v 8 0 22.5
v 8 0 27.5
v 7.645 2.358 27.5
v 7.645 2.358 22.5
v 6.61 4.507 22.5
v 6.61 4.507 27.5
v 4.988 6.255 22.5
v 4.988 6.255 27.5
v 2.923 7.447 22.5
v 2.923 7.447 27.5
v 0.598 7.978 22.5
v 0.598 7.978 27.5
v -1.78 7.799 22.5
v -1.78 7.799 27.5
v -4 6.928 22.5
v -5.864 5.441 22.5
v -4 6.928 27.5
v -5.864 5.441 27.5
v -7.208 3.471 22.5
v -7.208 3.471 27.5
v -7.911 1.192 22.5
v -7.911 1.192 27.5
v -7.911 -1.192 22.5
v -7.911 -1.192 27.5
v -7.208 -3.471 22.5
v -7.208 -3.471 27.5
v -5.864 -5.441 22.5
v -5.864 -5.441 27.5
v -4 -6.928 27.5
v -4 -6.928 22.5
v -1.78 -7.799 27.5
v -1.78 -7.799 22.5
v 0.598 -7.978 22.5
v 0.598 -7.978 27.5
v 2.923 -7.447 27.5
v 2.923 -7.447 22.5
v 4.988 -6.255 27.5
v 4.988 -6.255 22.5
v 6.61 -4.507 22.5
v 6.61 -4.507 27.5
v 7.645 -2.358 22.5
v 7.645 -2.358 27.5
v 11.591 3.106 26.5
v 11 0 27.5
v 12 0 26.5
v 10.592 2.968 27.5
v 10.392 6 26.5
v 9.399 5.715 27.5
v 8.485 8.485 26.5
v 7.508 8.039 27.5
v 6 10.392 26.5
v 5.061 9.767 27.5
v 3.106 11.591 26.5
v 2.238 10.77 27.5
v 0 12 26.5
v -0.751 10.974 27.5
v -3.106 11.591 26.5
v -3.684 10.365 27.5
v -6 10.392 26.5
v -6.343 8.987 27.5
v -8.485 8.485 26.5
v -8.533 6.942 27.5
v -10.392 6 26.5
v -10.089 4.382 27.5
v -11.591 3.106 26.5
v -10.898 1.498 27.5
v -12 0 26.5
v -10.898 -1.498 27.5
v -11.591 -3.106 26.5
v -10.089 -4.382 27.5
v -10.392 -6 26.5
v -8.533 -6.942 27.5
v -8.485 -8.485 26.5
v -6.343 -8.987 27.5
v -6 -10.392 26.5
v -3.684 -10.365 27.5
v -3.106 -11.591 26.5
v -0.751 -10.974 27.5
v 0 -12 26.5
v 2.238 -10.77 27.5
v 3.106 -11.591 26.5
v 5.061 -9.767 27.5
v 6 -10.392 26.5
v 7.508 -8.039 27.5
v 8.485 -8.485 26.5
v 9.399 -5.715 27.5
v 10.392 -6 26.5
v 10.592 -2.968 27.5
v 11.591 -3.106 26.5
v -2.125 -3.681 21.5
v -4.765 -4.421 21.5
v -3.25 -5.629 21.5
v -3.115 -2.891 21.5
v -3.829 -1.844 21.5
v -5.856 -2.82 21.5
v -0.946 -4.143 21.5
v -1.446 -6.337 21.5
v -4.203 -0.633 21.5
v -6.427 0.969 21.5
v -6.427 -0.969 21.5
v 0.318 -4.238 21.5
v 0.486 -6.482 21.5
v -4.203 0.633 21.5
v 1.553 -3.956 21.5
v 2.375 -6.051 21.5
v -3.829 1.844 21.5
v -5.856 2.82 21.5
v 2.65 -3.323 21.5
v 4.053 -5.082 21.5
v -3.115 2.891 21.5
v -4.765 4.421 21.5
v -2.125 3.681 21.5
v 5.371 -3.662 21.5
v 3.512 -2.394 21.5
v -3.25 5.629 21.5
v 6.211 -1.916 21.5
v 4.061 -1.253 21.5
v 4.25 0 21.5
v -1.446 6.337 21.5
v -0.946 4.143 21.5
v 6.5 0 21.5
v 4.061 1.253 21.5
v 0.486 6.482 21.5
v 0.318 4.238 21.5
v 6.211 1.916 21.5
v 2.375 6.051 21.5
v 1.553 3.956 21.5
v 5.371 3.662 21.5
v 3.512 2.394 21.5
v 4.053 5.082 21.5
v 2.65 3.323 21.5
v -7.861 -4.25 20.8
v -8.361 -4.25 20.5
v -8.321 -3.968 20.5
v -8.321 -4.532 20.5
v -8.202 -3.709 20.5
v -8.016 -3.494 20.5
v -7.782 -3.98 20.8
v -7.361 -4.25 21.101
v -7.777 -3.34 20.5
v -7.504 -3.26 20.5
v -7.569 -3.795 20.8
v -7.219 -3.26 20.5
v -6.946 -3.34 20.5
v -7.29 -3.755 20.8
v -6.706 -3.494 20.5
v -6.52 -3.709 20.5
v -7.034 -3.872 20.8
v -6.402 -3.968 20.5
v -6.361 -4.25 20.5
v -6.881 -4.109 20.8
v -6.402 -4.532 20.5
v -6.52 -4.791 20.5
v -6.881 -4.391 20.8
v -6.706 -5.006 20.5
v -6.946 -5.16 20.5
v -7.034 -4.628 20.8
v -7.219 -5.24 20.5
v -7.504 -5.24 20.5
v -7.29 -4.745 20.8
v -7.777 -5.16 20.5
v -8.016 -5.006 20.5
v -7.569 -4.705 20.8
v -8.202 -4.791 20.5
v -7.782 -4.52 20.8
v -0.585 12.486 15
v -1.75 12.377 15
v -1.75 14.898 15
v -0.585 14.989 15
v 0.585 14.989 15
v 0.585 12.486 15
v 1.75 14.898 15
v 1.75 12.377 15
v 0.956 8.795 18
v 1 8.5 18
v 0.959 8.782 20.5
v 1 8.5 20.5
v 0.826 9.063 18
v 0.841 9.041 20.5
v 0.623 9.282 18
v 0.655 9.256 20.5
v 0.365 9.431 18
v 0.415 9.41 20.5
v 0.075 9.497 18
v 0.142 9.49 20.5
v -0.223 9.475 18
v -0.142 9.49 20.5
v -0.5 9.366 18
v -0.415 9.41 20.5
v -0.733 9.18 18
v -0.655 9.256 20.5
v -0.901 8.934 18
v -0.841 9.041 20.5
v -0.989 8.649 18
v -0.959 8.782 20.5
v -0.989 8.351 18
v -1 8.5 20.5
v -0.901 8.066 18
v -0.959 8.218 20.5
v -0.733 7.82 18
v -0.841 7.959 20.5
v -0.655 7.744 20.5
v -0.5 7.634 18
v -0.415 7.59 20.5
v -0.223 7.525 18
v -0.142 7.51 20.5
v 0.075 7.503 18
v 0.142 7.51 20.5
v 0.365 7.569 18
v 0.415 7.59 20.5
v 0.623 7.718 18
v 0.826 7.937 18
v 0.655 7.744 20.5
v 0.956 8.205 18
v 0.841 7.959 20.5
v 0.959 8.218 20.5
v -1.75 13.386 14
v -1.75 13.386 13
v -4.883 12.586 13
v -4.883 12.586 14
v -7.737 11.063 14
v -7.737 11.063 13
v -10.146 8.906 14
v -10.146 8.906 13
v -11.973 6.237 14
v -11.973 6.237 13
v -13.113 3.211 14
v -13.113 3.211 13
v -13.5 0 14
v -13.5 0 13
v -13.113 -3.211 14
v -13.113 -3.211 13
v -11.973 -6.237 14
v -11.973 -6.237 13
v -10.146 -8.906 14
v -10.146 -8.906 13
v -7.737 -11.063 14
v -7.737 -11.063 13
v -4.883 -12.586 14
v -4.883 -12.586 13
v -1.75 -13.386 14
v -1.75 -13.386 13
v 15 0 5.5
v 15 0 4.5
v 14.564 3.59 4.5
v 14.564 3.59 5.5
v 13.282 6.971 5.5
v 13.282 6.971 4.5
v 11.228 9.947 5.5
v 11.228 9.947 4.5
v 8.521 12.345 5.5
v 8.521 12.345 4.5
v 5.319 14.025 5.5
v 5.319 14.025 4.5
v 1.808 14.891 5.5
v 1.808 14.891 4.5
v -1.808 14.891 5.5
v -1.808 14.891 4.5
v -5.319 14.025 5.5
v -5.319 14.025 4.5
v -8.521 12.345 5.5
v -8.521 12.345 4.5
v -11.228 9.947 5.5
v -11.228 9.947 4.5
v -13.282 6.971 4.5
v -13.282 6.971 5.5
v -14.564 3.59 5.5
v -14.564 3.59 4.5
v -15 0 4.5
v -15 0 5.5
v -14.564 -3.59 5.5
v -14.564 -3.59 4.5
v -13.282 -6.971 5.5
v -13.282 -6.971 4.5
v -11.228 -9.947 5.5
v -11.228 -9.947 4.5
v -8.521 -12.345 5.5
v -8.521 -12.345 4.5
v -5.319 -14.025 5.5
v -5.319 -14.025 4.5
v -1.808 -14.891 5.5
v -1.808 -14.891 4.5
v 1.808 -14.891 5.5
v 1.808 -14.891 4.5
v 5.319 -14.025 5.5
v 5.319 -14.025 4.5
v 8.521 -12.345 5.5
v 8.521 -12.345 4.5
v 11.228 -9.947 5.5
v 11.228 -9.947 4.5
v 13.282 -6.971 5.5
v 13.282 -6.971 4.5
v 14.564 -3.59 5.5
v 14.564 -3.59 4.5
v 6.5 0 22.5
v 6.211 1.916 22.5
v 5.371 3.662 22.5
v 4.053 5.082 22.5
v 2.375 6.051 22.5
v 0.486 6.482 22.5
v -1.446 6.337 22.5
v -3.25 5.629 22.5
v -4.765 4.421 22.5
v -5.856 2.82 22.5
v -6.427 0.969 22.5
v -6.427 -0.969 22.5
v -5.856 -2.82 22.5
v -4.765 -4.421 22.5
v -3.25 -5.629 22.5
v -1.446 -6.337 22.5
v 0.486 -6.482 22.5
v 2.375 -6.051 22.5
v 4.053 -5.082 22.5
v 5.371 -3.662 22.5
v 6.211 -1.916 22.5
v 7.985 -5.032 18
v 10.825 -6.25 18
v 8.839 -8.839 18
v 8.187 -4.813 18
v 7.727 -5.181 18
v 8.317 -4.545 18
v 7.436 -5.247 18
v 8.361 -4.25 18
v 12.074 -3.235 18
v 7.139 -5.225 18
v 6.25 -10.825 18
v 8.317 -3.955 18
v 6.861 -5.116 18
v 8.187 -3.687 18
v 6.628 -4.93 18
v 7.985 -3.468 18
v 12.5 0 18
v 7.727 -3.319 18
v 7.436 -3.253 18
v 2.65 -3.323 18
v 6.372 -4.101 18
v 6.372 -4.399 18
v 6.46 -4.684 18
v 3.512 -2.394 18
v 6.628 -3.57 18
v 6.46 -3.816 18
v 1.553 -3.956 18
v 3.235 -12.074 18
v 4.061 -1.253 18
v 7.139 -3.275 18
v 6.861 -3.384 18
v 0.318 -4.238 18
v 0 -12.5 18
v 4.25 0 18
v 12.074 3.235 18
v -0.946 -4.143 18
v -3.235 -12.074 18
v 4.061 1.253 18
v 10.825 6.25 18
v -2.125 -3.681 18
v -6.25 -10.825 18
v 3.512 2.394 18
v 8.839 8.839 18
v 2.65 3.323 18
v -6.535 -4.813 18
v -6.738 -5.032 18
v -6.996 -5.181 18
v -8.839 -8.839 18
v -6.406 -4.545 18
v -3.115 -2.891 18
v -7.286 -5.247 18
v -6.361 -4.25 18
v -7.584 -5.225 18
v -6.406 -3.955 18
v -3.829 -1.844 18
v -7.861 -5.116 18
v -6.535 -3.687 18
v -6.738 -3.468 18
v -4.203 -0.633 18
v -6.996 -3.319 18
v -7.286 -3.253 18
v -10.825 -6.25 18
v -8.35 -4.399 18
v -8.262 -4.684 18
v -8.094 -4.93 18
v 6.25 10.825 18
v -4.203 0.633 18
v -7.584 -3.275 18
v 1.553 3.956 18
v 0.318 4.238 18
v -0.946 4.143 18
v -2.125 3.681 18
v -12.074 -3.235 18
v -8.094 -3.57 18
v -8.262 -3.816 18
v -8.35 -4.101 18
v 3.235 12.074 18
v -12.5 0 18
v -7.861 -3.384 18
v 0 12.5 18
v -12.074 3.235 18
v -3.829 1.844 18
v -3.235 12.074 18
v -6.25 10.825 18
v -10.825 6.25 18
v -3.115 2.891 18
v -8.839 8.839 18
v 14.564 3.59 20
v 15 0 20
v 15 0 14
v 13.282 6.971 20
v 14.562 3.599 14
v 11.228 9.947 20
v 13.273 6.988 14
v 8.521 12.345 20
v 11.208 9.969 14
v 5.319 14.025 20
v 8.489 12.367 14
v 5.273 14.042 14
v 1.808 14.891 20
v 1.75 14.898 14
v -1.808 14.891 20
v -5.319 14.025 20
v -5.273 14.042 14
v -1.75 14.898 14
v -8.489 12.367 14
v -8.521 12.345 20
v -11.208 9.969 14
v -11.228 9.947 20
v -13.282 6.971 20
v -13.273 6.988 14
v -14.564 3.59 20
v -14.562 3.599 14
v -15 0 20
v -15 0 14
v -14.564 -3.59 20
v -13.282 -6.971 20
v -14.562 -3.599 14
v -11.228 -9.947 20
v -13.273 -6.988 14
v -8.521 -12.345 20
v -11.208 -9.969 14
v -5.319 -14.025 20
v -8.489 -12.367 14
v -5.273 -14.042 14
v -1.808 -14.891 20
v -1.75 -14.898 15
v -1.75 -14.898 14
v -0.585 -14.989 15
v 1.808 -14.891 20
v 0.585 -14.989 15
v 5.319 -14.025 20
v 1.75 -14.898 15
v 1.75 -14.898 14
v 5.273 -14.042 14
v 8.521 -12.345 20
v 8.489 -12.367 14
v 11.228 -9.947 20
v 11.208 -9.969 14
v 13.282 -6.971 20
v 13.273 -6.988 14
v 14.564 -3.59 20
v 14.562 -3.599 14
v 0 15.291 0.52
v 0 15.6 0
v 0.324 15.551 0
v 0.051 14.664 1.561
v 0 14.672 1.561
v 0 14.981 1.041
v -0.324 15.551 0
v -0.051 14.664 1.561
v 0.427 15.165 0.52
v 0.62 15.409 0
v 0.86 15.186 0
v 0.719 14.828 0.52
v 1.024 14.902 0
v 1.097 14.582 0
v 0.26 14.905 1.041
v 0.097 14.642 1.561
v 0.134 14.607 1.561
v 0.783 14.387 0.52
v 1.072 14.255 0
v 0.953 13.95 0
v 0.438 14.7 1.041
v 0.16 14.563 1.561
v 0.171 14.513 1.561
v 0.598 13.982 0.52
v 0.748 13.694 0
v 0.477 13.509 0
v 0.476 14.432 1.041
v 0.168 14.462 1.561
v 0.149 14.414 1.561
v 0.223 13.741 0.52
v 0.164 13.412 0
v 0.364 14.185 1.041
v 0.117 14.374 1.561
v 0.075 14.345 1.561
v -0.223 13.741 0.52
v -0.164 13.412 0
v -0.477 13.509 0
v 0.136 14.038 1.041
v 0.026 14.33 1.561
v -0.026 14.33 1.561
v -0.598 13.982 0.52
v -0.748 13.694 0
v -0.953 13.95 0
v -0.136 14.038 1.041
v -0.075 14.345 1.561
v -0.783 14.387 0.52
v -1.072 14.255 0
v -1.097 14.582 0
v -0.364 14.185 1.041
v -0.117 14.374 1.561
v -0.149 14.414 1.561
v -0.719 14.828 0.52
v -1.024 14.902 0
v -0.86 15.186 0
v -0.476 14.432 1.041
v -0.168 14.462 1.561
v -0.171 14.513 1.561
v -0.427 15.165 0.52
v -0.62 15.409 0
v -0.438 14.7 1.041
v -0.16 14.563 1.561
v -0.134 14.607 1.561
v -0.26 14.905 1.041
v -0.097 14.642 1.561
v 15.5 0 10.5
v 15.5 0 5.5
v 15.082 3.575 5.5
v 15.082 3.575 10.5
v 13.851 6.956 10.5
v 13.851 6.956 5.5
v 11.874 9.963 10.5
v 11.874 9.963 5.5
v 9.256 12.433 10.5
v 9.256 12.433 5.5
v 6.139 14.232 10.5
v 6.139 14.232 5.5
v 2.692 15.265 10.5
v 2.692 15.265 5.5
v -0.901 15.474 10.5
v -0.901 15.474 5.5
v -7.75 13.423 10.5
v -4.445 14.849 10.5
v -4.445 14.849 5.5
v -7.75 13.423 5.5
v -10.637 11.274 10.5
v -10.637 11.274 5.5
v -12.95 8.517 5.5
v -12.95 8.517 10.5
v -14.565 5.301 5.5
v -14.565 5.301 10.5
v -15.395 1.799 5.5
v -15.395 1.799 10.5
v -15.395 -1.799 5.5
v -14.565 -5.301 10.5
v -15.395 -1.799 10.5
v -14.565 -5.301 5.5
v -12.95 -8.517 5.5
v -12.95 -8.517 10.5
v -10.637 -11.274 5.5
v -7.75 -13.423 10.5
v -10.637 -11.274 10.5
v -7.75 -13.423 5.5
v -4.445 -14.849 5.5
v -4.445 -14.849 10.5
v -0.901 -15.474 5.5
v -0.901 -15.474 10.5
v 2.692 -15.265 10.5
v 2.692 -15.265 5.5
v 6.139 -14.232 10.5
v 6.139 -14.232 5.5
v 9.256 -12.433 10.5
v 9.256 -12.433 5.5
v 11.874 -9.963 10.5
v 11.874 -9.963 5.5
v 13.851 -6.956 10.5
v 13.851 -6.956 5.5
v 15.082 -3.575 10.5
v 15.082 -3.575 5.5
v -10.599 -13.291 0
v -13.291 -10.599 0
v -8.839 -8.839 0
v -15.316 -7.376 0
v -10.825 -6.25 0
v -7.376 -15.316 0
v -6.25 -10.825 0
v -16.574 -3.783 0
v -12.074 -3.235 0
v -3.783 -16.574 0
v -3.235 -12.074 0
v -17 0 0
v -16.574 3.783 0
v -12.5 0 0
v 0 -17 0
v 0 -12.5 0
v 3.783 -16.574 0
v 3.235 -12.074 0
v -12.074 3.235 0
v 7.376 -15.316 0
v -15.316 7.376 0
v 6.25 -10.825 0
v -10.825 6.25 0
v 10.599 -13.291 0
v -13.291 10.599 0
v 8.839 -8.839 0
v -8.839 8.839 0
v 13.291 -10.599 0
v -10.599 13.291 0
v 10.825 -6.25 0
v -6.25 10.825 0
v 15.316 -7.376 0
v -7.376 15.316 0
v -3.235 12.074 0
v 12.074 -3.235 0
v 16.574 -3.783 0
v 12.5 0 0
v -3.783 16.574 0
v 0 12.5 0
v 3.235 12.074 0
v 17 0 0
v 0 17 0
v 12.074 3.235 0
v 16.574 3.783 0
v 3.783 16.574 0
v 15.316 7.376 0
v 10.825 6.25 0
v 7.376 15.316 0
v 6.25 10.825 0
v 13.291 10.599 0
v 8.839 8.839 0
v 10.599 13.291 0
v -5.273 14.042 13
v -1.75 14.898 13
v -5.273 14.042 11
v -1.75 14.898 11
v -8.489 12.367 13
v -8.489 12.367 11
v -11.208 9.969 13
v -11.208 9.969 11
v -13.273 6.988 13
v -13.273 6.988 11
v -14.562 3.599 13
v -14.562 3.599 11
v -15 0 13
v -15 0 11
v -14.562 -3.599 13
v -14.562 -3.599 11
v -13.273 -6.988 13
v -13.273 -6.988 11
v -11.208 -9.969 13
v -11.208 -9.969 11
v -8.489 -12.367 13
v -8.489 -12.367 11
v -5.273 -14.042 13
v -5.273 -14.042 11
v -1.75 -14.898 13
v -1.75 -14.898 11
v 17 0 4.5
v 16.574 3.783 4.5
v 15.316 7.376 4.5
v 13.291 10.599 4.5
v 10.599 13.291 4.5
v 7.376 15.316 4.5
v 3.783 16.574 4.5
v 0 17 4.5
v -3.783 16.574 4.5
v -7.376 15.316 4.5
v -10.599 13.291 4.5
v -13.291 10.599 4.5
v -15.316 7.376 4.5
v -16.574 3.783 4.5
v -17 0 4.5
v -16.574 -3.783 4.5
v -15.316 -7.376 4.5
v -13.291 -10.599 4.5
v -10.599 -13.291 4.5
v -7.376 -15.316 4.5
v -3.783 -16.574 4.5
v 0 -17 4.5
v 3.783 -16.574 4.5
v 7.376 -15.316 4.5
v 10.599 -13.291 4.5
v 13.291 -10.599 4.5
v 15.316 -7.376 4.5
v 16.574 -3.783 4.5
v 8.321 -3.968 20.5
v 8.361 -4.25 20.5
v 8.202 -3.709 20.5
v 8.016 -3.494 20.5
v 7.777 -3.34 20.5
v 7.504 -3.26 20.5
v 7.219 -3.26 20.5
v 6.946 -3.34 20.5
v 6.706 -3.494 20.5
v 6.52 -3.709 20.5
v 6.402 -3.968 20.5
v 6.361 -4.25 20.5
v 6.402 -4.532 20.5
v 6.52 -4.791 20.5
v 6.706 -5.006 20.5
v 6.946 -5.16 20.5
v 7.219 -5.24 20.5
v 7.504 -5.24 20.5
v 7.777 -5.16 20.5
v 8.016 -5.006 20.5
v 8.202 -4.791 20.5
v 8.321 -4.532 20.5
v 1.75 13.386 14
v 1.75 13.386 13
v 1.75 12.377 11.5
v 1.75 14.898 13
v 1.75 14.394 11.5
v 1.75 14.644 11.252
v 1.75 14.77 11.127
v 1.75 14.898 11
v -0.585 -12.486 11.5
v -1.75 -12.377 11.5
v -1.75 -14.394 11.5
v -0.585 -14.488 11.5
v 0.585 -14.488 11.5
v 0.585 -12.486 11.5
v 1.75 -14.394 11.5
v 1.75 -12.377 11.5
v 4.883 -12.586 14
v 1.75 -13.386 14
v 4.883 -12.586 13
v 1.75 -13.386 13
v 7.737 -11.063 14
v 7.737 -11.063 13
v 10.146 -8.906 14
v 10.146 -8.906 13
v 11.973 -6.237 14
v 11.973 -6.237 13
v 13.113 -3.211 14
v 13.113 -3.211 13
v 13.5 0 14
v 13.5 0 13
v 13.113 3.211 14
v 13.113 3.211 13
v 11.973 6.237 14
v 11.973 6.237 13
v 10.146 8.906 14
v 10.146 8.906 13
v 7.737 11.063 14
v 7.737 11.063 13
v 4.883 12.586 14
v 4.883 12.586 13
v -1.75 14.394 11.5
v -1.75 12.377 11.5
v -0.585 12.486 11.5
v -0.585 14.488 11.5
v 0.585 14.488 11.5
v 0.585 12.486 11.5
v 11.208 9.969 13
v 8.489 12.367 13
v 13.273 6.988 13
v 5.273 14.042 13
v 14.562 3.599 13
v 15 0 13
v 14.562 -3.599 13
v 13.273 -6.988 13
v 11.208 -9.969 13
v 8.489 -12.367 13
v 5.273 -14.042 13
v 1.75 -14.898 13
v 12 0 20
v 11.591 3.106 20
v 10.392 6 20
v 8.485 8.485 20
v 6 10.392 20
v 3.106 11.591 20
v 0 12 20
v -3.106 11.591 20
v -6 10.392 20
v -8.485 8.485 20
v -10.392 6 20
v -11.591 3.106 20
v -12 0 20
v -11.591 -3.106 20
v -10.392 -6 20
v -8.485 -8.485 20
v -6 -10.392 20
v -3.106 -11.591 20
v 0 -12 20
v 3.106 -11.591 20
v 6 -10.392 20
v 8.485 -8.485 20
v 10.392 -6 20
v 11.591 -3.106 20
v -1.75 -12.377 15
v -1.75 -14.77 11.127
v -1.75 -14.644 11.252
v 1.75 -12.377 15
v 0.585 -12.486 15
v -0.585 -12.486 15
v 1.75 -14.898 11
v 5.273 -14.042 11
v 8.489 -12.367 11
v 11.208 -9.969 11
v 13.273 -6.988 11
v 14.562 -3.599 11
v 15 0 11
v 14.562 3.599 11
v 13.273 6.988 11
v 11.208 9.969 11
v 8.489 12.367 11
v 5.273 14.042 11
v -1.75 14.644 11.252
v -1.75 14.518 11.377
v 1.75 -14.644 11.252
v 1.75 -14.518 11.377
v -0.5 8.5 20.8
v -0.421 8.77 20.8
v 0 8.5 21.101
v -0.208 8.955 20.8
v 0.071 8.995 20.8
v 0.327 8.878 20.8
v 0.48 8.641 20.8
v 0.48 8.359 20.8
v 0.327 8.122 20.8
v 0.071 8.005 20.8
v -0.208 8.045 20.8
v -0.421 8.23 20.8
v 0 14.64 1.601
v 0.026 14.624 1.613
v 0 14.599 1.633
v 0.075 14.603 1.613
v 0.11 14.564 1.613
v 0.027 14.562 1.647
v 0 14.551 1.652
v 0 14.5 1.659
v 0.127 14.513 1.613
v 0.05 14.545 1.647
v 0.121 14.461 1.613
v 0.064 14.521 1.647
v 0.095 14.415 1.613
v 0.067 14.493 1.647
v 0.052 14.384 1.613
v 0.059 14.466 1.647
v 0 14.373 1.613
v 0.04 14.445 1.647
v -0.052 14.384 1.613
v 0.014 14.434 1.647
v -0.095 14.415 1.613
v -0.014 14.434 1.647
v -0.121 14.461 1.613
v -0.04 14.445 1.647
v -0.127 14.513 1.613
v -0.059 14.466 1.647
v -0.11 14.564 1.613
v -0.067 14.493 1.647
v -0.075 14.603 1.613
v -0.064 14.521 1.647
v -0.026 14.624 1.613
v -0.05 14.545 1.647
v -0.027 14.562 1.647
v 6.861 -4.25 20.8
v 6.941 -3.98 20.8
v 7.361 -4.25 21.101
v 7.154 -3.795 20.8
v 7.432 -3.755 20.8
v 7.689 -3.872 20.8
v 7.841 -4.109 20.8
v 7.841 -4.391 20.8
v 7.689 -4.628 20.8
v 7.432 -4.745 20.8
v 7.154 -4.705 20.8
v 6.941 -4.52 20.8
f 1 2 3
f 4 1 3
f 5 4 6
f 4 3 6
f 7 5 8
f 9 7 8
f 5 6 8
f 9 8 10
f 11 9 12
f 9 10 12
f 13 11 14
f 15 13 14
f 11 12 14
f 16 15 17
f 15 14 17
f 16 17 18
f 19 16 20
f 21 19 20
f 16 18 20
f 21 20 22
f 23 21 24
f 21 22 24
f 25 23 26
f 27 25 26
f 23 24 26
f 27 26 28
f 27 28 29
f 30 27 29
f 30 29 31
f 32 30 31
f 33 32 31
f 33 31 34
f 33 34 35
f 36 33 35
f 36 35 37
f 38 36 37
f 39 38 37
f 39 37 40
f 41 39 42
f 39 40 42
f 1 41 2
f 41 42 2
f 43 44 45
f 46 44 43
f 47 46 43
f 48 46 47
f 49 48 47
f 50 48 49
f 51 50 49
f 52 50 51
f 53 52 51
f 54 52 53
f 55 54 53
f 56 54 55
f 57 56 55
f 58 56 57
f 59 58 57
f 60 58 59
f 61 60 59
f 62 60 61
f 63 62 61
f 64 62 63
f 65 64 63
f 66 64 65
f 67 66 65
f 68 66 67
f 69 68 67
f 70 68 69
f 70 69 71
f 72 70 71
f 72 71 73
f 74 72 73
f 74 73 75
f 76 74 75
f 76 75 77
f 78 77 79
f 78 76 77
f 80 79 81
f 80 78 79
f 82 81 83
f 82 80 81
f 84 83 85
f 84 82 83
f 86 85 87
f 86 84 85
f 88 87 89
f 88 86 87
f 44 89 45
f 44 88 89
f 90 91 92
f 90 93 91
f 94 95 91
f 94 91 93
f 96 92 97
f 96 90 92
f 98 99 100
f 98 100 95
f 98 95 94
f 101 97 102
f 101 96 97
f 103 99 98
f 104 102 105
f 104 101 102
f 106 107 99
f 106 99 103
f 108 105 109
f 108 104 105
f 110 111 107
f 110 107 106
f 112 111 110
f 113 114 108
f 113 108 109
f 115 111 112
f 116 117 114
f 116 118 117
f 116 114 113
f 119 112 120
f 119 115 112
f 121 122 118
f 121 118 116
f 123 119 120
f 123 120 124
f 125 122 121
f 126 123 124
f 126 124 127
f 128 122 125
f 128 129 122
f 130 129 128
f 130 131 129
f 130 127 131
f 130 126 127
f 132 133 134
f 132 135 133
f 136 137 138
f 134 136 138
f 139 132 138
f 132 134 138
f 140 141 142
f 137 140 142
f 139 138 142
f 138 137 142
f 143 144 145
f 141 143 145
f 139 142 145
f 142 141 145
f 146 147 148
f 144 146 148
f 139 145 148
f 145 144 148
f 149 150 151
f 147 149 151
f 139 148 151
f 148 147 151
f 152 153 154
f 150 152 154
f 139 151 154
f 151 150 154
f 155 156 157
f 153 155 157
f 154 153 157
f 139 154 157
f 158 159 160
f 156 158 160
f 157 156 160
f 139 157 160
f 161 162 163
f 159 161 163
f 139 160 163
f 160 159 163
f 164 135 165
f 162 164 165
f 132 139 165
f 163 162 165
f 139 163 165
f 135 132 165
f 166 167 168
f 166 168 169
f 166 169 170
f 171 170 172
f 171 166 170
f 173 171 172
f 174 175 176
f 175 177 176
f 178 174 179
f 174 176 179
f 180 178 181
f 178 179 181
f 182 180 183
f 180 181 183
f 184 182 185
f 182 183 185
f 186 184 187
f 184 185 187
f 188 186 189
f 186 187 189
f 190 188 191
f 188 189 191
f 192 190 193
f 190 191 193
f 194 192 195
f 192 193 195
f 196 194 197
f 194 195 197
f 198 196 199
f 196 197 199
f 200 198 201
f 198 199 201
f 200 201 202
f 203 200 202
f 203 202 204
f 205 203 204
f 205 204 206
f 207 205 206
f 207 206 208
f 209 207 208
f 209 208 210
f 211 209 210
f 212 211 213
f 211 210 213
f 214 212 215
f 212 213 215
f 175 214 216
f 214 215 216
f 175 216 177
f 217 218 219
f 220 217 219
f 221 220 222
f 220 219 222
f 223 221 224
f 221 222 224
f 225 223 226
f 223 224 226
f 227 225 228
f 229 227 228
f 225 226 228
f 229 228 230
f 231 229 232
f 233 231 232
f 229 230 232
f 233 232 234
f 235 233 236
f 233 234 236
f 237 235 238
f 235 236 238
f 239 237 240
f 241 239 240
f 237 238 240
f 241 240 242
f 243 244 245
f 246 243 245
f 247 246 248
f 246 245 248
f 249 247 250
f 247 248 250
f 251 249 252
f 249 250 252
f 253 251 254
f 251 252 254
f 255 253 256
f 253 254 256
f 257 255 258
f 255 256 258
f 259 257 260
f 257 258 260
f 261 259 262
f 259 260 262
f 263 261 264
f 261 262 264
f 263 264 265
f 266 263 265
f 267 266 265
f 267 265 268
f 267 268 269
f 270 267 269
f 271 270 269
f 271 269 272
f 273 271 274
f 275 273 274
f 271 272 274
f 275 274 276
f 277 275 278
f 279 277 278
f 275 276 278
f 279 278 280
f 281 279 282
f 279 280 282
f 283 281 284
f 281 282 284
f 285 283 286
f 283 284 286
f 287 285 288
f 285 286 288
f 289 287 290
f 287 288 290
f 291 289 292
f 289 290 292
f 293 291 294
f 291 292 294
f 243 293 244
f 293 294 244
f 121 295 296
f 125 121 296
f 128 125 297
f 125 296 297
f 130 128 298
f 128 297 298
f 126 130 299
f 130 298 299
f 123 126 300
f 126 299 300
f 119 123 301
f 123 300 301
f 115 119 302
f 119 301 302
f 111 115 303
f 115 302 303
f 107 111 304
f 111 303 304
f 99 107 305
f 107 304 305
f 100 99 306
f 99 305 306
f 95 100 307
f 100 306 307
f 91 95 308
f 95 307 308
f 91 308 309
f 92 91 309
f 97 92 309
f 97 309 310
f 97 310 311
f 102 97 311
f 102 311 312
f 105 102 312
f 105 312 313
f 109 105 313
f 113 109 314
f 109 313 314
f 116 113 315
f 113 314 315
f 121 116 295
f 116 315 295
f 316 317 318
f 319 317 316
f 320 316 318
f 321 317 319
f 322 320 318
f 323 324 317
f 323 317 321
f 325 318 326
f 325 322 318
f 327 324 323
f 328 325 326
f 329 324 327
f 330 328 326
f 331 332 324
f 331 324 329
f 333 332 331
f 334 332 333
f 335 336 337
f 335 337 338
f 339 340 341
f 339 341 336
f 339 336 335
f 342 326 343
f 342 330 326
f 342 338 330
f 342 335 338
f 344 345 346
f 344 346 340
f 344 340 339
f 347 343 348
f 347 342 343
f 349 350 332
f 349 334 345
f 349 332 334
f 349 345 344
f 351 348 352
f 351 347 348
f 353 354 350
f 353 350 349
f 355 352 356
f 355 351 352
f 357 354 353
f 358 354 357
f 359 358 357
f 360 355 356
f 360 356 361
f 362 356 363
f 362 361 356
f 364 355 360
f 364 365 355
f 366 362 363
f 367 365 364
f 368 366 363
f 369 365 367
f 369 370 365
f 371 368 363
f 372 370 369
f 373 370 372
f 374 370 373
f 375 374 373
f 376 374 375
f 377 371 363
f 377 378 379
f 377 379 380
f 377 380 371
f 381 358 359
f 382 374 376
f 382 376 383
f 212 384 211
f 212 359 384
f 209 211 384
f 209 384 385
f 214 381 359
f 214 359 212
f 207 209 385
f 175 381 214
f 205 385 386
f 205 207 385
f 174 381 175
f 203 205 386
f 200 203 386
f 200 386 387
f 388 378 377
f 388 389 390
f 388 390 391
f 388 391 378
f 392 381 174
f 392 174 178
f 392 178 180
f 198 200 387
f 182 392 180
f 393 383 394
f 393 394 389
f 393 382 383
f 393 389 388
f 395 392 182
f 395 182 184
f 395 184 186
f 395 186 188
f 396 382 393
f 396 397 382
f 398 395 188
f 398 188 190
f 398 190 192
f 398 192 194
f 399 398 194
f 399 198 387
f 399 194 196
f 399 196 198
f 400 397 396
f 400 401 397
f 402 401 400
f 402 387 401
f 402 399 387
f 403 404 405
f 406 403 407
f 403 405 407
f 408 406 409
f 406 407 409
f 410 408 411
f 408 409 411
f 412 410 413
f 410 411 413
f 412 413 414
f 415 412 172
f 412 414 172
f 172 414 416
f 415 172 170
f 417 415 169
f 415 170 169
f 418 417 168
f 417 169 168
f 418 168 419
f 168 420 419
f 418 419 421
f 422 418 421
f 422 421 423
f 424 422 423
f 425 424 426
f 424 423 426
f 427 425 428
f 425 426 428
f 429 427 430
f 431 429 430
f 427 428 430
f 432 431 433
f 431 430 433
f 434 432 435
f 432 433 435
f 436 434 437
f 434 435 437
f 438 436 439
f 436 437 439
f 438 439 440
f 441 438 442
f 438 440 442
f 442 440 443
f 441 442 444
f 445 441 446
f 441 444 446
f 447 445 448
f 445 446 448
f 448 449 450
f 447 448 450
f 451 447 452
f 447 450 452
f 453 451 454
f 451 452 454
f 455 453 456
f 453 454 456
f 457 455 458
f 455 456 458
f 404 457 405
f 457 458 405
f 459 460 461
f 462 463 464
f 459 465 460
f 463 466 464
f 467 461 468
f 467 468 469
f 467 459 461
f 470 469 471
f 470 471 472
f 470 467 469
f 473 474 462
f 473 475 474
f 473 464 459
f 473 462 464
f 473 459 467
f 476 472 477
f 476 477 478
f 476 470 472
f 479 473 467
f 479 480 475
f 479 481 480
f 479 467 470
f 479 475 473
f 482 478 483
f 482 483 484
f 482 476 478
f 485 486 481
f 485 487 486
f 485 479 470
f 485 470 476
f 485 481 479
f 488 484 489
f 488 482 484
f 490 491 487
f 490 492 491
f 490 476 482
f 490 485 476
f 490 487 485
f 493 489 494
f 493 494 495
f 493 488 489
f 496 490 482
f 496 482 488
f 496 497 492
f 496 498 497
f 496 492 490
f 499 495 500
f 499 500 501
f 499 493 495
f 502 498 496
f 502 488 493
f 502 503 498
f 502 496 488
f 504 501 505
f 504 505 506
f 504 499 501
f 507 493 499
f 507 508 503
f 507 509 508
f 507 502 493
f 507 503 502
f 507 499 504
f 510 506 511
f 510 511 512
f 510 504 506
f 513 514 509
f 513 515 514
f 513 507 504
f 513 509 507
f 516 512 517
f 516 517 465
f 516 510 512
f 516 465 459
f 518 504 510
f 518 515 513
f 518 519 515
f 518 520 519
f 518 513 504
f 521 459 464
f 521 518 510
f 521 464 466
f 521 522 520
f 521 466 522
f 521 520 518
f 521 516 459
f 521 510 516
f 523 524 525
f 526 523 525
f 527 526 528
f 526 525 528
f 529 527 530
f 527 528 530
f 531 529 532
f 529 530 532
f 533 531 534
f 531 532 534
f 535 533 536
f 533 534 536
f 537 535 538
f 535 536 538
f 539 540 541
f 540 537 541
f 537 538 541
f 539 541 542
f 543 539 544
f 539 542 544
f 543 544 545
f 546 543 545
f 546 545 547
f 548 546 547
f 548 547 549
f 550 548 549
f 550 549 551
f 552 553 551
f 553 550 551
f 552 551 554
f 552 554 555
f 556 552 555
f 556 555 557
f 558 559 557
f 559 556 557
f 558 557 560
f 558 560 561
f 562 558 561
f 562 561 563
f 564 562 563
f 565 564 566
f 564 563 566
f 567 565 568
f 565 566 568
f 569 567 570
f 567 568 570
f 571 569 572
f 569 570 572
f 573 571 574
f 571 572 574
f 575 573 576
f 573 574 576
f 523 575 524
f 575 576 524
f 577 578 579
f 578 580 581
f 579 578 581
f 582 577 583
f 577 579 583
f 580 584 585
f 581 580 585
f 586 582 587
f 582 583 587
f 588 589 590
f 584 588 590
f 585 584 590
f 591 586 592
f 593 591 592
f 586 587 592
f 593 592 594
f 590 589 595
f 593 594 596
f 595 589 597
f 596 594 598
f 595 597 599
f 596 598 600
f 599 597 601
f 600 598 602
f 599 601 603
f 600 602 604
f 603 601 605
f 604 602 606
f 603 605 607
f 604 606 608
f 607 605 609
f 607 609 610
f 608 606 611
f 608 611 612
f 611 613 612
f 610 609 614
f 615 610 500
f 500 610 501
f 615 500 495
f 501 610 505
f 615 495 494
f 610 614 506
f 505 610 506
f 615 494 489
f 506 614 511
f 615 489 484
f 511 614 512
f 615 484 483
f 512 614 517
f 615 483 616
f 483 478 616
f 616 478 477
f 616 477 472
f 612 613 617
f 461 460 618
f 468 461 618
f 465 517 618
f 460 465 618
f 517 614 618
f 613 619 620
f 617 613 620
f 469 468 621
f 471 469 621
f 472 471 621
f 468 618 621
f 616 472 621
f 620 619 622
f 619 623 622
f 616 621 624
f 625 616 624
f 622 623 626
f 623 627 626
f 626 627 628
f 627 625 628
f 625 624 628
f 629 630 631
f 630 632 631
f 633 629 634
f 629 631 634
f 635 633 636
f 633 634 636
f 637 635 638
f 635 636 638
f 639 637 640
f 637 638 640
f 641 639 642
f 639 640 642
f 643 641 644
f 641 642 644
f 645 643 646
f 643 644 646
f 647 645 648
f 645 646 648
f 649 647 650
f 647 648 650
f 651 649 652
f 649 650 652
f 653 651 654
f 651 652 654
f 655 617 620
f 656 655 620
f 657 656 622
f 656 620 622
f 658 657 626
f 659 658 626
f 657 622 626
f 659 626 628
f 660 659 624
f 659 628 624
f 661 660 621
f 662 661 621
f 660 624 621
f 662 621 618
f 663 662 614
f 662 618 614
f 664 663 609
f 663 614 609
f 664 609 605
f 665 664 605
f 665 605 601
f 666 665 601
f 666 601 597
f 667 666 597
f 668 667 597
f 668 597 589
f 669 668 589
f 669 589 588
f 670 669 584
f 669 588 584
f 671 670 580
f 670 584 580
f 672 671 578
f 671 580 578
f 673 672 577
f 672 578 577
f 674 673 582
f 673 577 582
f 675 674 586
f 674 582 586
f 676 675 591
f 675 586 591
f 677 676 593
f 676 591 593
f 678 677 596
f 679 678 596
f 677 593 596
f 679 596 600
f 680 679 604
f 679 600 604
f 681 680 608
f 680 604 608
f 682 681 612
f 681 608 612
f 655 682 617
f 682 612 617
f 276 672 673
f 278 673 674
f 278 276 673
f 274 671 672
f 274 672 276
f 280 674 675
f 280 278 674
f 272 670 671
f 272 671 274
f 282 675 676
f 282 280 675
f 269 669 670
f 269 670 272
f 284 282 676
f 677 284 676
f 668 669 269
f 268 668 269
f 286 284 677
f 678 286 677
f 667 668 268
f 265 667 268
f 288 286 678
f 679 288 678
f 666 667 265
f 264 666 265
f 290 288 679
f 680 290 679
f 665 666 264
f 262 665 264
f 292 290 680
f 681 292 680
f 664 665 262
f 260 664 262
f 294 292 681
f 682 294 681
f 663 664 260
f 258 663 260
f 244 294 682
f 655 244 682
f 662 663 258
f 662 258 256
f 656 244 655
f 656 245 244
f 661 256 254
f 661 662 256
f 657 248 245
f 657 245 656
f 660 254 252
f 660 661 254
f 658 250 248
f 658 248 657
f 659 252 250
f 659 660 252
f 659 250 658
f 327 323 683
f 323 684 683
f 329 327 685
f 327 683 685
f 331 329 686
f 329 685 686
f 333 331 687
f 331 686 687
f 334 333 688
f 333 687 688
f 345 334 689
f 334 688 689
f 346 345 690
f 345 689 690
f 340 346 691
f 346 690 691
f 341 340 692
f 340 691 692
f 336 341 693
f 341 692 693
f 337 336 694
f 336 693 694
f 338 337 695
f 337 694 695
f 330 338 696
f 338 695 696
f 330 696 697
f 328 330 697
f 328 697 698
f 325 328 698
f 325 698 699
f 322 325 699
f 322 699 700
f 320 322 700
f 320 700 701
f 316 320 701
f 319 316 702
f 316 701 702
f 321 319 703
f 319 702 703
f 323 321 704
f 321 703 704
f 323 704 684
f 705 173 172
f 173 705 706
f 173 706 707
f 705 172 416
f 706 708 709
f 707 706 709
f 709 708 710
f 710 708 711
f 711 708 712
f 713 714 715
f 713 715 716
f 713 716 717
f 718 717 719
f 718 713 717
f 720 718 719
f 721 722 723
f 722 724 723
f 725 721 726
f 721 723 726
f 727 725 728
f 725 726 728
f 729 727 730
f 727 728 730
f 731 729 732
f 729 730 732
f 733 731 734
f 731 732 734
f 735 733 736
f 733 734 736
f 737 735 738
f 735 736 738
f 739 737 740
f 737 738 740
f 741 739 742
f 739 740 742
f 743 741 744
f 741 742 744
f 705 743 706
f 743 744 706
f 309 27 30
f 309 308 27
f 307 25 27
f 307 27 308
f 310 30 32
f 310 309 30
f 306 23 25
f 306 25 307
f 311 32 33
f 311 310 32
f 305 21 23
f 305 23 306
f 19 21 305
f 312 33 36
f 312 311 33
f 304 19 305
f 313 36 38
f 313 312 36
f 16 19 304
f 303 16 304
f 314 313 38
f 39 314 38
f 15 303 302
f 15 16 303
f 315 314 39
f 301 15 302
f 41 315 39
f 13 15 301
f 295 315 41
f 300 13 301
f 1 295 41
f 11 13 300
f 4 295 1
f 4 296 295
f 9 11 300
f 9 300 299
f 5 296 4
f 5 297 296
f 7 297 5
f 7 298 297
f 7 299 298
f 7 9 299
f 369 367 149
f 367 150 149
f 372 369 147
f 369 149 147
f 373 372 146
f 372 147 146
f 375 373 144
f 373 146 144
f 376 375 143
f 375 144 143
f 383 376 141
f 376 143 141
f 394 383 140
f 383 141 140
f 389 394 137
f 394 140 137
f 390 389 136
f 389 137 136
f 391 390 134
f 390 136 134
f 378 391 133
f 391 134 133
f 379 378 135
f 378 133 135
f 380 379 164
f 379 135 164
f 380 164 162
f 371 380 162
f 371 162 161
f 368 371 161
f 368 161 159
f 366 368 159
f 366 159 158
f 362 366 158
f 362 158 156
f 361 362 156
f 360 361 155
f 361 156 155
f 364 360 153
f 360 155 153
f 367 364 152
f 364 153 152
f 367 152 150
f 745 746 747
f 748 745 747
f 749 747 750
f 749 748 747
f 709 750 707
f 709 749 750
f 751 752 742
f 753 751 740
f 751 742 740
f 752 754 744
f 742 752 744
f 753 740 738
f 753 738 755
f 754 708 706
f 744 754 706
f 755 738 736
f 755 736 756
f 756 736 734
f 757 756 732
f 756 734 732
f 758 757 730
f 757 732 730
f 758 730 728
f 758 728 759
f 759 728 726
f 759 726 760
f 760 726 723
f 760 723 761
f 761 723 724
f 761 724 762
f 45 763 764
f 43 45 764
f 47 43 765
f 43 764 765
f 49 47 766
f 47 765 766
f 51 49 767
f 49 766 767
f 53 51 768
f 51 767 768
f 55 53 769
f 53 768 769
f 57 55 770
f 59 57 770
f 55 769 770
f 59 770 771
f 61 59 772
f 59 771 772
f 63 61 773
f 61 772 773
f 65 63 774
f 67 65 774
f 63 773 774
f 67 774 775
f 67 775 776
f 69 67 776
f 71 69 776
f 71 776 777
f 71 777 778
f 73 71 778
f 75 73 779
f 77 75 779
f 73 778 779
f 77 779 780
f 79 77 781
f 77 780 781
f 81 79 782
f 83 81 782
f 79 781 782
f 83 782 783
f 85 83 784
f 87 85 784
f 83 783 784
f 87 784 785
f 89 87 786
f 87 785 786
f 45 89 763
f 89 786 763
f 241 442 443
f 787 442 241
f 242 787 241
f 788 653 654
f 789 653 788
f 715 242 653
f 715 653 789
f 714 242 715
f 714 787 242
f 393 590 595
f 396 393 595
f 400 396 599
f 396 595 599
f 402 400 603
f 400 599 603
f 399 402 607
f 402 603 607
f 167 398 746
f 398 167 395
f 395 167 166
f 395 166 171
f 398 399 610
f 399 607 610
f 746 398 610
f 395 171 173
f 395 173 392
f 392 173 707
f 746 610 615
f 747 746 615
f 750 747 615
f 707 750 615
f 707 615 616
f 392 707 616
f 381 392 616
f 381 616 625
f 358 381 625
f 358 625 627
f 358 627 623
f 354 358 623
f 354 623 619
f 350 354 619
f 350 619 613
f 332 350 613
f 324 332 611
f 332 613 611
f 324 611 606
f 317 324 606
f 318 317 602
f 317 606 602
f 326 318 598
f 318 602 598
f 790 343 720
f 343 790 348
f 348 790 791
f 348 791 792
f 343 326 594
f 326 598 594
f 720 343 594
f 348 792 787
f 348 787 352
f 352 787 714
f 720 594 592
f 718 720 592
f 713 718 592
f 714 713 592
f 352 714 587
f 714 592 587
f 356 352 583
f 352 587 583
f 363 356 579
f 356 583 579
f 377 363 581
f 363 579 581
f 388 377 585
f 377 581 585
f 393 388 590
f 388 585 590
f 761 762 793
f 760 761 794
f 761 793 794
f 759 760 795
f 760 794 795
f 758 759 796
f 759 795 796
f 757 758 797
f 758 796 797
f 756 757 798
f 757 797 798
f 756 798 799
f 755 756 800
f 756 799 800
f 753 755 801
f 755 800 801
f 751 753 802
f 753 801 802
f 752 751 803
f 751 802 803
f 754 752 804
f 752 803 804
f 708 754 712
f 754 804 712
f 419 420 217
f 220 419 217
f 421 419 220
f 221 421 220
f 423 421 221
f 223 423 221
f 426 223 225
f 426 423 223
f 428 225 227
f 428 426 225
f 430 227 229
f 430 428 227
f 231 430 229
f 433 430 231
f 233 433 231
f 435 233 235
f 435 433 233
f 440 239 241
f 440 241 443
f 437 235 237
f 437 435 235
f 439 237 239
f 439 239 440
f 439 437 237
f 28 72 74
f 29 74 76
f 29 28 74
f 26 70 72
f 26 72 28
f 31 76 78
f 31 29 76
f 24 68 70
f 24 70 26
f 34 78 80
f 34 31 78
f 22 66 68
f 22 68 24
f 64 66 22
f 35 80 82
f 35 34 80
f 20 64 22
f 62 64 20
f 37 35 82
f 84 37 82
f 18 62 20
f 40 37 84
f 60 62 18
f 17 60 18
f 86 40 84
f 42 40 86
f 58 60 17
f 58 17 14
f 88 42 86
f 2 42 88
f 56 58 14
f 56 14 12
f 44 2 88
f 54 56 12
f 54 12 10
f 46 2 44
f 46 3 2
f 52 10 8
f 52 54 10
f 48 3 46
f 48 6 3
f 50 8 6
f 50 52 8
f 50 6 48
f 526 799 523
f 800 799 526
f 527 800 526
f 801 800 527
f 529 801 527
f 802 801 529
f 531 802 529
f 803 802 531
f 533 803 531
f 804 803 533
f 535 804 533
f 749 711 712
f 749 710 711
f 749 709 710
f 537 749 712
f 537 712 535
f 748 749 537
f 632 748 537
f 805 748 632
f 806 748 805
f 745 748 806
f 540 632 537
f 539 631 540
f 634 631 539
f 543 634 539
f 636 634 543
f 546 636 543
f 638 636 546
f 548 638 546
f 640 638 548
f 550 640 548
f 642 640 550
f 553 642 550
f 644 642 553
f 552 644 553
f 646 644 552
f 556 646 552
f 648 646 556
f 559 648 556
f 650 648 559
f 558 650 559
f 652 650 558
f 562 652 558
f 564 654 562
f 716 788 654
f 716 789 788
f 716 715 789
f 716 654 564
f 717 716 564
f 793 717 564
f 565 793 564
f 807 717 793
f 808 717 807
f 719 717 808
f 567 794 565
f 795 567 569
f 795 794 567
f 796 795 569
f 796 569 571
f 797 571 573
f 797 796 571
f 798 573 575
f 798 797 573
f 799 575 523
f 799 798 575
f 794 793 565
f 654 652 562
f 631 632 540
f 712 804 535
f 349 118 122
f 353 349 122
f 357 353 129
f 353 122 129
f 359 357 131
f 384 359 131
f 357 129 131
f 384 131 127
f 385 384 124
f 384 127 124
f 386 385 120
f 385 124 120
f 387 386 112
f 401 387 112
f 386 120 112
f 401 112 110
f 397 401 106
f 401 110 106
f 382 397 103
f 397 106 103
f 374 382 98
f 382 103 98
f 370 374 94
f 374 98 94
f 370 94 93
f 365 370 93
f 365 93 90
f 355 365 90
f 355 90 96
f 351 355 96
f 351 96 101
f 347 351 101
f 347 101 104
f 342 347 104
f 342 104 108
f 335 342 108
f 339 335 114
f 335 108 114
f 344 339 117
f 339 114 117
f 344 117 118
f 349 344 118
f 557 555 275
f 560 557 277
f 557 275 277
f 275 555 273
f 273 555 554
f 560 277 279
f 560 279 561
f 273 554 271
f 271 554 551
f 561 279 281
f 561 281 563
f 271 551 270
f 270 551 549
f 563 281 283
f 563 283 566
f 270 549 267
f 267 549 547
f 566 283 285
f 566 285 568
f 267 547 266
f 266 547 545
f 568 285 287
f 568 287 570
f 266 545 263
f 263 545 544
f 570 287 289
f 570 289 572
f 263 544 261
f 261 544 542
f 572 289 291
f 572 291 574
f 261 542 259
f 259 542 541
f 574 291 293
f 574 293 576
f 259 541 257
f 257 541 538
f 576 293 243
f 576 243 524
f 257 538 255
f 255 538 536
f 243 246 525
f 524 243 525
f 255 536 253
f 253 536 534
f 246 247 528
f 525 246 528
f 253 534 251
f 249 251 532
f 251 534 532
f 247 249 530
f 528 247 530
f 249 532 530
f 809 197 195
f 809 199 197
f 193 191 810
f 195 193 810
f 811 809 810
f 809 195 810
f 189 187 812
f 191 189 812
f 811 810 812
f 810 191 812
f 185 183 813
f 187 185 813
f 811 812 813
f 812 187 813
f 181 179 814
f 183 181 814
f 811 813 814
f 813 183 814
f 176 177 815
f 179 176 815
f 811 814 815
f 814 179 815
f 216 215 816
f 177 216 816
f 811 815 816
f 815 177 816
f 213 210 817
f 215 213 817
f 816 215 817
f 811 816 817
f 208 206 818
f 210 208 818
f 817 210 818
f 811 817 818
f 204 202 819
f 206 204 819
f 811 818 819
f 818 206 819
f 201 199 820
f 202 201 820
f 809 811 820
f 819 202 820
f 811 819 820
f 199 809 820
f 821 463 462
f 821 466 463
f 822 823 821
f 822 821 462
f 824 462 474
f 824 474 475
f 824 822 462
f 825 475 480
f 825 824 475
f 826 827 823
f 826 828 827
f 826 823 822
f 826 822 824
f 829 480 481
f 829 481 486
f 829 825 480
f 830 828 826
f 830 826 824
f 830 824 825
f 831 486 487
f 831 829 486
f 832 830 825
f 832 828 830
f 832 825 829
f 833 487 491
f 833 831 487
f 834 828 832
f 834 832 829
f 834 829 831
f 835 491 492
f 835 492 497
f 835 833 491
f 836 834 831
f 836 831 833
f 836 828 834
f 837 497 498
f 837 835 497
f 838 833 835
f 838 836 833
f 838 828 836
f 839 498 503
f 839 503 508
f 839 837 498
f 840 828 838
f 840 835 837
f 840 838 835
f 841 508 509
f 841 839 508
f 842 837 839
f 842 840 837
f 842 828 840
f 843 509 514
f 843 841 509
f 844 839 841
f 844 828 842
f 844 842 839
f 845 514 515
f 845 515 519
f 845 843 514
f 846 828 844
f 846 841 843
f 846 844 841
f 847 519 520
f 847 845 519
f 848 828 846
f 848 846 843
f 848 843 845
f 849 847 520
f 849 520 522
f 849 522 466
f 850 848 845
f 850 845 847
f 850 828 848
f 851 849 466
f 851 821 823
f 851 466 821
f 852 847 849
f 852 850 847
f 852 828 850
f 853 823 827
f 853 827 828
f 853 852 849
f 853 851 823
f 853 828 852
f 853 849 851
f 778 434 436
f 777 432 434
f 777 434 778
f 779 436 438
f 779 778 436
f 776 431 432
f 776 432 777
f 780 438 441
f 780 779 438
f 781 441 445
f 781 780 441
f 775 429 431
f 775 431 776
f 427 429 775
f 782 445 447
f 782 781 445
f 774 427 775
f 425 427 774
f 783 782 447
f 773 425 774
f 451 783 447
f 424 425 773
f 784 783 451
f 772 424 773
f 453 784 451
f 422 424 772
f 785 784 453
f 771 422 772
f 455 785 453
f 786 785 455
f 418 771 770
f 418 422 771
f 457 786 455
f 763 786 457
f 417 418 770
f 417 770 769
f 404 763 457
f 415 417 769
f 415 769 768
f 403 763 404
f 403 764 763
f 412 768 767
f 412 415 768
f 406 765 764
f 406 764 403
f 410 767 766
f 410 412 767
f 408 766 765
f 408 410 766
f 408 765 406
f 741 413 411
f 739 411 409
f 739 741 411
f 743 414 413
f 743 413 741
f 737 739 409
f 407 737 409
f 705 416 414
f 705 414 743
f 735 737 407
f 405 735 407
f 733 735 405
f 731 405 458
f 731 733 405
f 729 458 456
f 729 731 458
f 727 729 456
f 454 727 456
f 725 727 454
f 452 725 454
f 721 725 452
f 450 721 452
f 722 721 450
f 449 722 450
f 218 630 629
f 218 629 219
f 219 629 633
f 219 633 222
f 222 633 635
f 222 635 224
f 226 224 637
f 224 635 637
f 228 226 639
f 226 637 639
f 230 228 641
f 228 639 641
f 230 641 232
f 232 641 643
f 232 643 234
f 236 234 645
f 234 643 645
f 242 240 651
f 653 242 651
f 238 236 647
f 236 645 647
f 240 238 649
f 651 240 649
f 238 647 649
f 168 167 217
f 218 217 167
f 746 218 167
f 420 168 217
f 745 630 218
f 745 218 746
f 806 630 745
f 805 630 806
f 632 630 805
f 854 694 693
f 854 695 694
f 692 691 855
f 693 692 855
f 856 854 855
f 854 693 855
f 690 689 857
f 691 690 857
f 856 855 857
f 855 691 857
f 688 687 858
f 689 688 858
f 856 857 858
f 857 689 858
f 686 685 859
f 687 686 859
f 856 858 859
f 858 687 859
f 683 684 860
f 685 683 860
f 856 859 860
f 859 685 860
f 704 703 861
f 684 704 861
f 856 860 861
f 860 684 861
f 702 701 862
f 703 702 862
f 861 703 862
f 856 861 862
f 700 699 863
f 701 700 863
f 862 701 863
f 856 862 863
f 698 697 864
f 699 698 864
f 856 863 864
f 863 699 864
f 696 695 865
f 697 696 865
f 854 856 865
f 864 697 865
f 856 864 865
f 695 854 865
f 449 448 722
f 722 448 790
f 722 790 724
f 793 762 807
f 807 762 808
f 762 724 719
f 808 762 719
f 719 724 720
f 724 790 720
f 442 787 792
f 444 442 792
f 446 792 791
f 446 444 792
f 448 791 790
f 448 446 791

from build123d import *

# Parameters (mm, degrees)
SKETCH1_R                           = 17
BOSS_EXTRUDE1_DEPTH                 = 4.5
SKETCH2_R                           = 15
BOSS_EXTRUDE2_DEPTH                 = 1
SKETCH3_R                           = 15.5
BOSS_EXTRUDE3_DEPTH                 = 6
SKETCH7_R                           = 15
BOSS_EXTRUDE4_DEPTH                 = 8.5
SKETCH8_R                           = 12
BOSS_EXTRUDE5_DEPTH                 = 7.5
CUT_EXTRUDE1_REACH                  = 38.527
CUT_EXTRUDE1_END_RADIUS             = 15
SKETCH9_W                           = 3.5
SKETCH9_H                           = 3.5
CUT_EXTRUDE1_DIRECTION_2_REACH      = 38.527
CUT_EXTRUDE1_DIRECTION_2_END_RADIUS = 15
CHAMFER1_SIZE                       = 1
CHAMFER2_SIZE                       = 1
SKETCH10_R                          = 12.5
CUT_EXTRUDE2_DEPTH                  = 18
SKETCH11_R                          = 8
CUT_EXTRUDE3_DEPTH                  = 5
SKETCH12_R                          = 6.5
CUT_EXTRUDE4_DEPTH                  = 1
SKETCH13_R                          = 4.25
CUT_EXTRUDE5_DEPTH                  = 3.5
SKETCH17_W                          = 1
SKETCH17_H                          = 1.5
F_2_0_2_DIAMETER_HOLE1_D            = 2
F_2_0_2_DIAMETER_HOLE1_DEPTH        = 2.5
F_2_0_2_DIAMETER_HOLE1_TIP          = 0.600860619


with BuildPart() as part:
    # Sketch1 → Boss-Extrude1 (new body)
    with BuildSketch(Plane.XY):
        Circle(SKETCH1_R)
    extrude(amount=BOSS_EXTRUDE1_DEPTH)

    # Sketch2 → Boss-Extrude2 (add)
    with BuildSketch(Plane.XY.offset(4.5)):
        Circle(SKETCH2_R)
    extrude(amount=BOSS_EXTRUDE2_DEPTH)

    # Sketch3 → Boss-Extrude3 (add)
    with BuildSketch(Plane.XY.offset(5.5)):
        Circle(SKETCH3_R)
    extrude(amount=BOSS_EXTRUDE3_DEPTH)

    # Sketch7 → Boss-Extrude4 (add)
    with BuildSketch(Plane.XY.offset(11.5)):
        Circle(SKETCH7_R)
    extrude(amount=BOSS_EXTRUDE4_DEPTH)

    # Sketch8 → Boss-Extrude5 (add)
    with BuildSketch(Plane.XY.offset(20)):
        Circle(SKETCH8_R)
    extrude(amount=BOSS_EXTRUDE5_DEPTH)

    # Cut-Extrude1: up to this cylinder (the profile starts inside it)
    cut_extrude1_end = Plane(origin=(0, 0, 13.25), z_dir=(0, 0, -1)) * Cylinder(CUT_EXTRUDE1_END_RADIUS, 108.054, mode=Mode.PRIVATE)
    # Sketch9 → Cut-Extrude1 (cut, up to the surface)
    with BuildSketch(Plane(origin=(0, 0, 0), x_dir=(1, 0, 0), z_dir=(0, 1, 0)), mode=Mode.PRIVATE) as cut_extrude1_sk1:
        with Locations((0, -13.25)):
            Rectangle(SKETCH9_W, SKETCH9_H)
    cut_extrude1_tool1 = extrude(cut_extrude1_sk1.sketch, amount=-CUT_EXTRUDE1_REACH, mode=Mode.PRIVATE) & cut_extrude1_end
    add(cut_extrude1_tool1.solids().sort_by_distance((0, 0, 13.25))[0], mode=Mode.SUBTRACT)

    # Cut-Extrude1 direction 2: up to this cylinder (the profile starts inside it)
    cut_extrude1_direction_2_end = Plane(origin=(0, 0, 13.25), z_dir=(0, 0, -1)) * Cylinder(CUT_EXTRUDE1_DIRECTION_2_END_RADIUS, 108.054, mode=Mode.PRIVATE)
    # Sketch9 → Cut-Extrude1 direction 2 (cut, up to the surface)
    with BuildSketch(Plane(origin=(0, 0, 0), x_dir=(1, 0, 0), z_dir=(0, 1, 0)), mode=Mode.PRIVATE) as cut_extrude1_direction_2_sk1:
        with Locations((0, -13.25)):
            Rectangle(SKETCH9_W, SKETCH9_H)
    cut_extrude1_direction_2_tool1 = extrude(cut_extrude1_direction_2_sk1.sketch, amount=CUT_EXTRUDE1_DIRECTION_2_REACH, mode=Mode.PRIVATE) & cut_extrude1_direction_2_end
    add(cut_extrude1_direction_2_tool1.solids().sort_by_distance((0, 0, 13.25))[0], mode=Mode.SUBTRACT)

    # Chamfer1
    # the kernel refuses this chamfer: 1 mm, written as the material it takes off along each edge
    with BuildSketch(Plane(origin=(0, 0, 11.5), x_dir=(1, 0, 0), z_dir=(0, -1, 0))) as chamfer1_piece_1_section:
        Polygon((15.5, -CHAMFER1_SIZE), (15.5 - CHAMFER1_SIZE, 0), (15.5, 0), align=None)
    chamfer1_piece_1 = revolve(axis=Axis((0, 0, 11.5), (0, 0, 1)), mode=Mode.PRIVATE)
    chamfer1_piece_1 = chamfer1_piece_1 - Plane(origin=(0, 0, 10.7680681), x_dir=(1, 0, 0), z_dir=(0, 0, -1)) * Cylinder(15, 62, mode=Mode.PRIVATE)
    add(chamfer1_piece_1, mode=Mode.SUBTRACT)
    with BuildSketch(Plane(origin=(0, 0, 11.5), x_dir=(1, 0, 0), z_dir=(0, -1, 0))) as chamfer1_piece_2_section:
        Polygon((15.5, -CHAMFER1_SIZE), (15.5 - CHAMFER1_SIZE, 0), (15.5, 0), align=None)
    chamfer1_piece_2 = revolve(axis=Axis((0, 0, 11.5), (0, 0, 1)), mode=Mode.PRIVATE)
    chamfer1_piece_2 = split(chamfer1_piece_2, bisect_by=Plane(origin=(-1.75, 14.798779875, 11.333335543), z_dir=(1, 0, 0)), keep=Keep.TOP, mode=Mode.PRIVATE)
    chamfer1_piece_2 = split(chamfer1_piece_2, bisect_by=Plane(origin=(1.75, 14.798779875, 11.333335543), z_dir=(-1, 0, 0)), keep=Keep.TOP, mode=Mode.PRIVATE)
    add(chamfer1_piece_2, mode=Mode.SUBTRACT)

    # Chamfer2
    chamfer2_edges = [part.edges().sort_by_distance(p)[0] for p in [
        (-12, 0, 27.5),
    ]]
    chamfer(chamfer2_edges, length=CHAMFER2_SIZE)

    # Sketch10 → Cut-Extrude2 (cut)
    with BuildSketch(Plane(origin=(0, 0, 0), x_dir=(-1, 0, 0), z_dir=(0, 0, -1))):
        Circle(SKETCH10_R)
    extrude(amount=-CUT_EXTRUDE2_DEPTH, mode=Mode.SUBTRACT)

    # Sketch11 → Cut-Extrude3 (cut)
    with BuildSketch(Plane.XY.offset(27.5)):
        Circle(SKETCH11_R)
    extrude(amount=-CUT_EXTRUDE3_DEPTH, mode=Mode.SUBTRACT)

    # Sketch12 → Cut-Extrude4 (cut)
    with BuildSketch(Plane.XY.offset(22.5)):
        Circle(SKETCH12_R)
    extrude(amount=-CUT_EXTRUDE4_DEPTH, mode=Mode.SUBTRACT)

    # Sketch13 → Cut-Extrude5 (cut)
    with BuildSketch(Plane.XY.offset(21.5)):
        Circle(SKETCH13_R)
    extrude(amount=-CUT_EXTRUDE5_DEPTH, mode=Mode.SUBTRACT)

    # Sketch6 → Cut-Revolve4 (revolve, cut)
    with BuildSketch(Plane(origin=(0, 0, 0), x_dir=(0, 0, -1), z_dir=(1, 0, 0))):
        with BuildLine():
            Line((0, 14.5), (0, 15.6))
            Line((0, 15.6), (-1.560883383, 14.671907178))
            ThreePointArc((-1.560883383, 14.671907178), (-1.632511647, 14.598886259), (-1.658668305, 14.5))
            Line((-1.658668305, 14.5), (0, 14.5))
        make_face()
    revolve(axis=Axis((0, 14.5, 1.658668305), (0, 0, -1)), mode=Mode.SUBTRACT)

    # Sketch17 → Cut-Revolve5 (revolve, cut)
    with BuildSketch(Plane(origin=(0, 0, 0), x_dir=(0, 0, -1), z_dir=(1, 0, 0)), mode=Mode.PRIVATE) as cut_revolve5_sk:
        with Locations((-13.5, 14.25)):
            Rectangle(SKETCH17_W, SKETCH17_H)
    revolve(cut_revolve5_sk.sketch.rotate(Axis((0, 0, 0), (0, 0, 1)), 6.699765178), axis=Axis((0, 0, 0), (0, 0, 1)), mode=Mode.SUBTRACT)

    # Ø2.0 (2) Diameter Hole1
    with Locations(Plane(origin=(0, 0, 18), x_dir=(-1, 0, 0), z_dir=(0, 0, -1))):
        with Locations((0, 8.5), (7.361215932, -4.25), (-7.361215932, -4.25)):
            Hole(F_2_0_2_DIAMETER_HOLE1_D / 2, depth=F_2_0_2_DIAMETER_HOLE1_DEPTH)
            with Locations((0, 0, -(F_2_0_2_DIAMETER_HOLE1_DEPTH + F_2_0_2_DIAMETER_HOLE1_TIP / 2))):  # 118° drill point
                Cone(0, F_2_0_2_DIAMETER_HOLE1_D / 2, F_2_0_2_DIAMETER_HOLE1_TIP, mode=Mode.SUBTRACT)


solid = part.part
